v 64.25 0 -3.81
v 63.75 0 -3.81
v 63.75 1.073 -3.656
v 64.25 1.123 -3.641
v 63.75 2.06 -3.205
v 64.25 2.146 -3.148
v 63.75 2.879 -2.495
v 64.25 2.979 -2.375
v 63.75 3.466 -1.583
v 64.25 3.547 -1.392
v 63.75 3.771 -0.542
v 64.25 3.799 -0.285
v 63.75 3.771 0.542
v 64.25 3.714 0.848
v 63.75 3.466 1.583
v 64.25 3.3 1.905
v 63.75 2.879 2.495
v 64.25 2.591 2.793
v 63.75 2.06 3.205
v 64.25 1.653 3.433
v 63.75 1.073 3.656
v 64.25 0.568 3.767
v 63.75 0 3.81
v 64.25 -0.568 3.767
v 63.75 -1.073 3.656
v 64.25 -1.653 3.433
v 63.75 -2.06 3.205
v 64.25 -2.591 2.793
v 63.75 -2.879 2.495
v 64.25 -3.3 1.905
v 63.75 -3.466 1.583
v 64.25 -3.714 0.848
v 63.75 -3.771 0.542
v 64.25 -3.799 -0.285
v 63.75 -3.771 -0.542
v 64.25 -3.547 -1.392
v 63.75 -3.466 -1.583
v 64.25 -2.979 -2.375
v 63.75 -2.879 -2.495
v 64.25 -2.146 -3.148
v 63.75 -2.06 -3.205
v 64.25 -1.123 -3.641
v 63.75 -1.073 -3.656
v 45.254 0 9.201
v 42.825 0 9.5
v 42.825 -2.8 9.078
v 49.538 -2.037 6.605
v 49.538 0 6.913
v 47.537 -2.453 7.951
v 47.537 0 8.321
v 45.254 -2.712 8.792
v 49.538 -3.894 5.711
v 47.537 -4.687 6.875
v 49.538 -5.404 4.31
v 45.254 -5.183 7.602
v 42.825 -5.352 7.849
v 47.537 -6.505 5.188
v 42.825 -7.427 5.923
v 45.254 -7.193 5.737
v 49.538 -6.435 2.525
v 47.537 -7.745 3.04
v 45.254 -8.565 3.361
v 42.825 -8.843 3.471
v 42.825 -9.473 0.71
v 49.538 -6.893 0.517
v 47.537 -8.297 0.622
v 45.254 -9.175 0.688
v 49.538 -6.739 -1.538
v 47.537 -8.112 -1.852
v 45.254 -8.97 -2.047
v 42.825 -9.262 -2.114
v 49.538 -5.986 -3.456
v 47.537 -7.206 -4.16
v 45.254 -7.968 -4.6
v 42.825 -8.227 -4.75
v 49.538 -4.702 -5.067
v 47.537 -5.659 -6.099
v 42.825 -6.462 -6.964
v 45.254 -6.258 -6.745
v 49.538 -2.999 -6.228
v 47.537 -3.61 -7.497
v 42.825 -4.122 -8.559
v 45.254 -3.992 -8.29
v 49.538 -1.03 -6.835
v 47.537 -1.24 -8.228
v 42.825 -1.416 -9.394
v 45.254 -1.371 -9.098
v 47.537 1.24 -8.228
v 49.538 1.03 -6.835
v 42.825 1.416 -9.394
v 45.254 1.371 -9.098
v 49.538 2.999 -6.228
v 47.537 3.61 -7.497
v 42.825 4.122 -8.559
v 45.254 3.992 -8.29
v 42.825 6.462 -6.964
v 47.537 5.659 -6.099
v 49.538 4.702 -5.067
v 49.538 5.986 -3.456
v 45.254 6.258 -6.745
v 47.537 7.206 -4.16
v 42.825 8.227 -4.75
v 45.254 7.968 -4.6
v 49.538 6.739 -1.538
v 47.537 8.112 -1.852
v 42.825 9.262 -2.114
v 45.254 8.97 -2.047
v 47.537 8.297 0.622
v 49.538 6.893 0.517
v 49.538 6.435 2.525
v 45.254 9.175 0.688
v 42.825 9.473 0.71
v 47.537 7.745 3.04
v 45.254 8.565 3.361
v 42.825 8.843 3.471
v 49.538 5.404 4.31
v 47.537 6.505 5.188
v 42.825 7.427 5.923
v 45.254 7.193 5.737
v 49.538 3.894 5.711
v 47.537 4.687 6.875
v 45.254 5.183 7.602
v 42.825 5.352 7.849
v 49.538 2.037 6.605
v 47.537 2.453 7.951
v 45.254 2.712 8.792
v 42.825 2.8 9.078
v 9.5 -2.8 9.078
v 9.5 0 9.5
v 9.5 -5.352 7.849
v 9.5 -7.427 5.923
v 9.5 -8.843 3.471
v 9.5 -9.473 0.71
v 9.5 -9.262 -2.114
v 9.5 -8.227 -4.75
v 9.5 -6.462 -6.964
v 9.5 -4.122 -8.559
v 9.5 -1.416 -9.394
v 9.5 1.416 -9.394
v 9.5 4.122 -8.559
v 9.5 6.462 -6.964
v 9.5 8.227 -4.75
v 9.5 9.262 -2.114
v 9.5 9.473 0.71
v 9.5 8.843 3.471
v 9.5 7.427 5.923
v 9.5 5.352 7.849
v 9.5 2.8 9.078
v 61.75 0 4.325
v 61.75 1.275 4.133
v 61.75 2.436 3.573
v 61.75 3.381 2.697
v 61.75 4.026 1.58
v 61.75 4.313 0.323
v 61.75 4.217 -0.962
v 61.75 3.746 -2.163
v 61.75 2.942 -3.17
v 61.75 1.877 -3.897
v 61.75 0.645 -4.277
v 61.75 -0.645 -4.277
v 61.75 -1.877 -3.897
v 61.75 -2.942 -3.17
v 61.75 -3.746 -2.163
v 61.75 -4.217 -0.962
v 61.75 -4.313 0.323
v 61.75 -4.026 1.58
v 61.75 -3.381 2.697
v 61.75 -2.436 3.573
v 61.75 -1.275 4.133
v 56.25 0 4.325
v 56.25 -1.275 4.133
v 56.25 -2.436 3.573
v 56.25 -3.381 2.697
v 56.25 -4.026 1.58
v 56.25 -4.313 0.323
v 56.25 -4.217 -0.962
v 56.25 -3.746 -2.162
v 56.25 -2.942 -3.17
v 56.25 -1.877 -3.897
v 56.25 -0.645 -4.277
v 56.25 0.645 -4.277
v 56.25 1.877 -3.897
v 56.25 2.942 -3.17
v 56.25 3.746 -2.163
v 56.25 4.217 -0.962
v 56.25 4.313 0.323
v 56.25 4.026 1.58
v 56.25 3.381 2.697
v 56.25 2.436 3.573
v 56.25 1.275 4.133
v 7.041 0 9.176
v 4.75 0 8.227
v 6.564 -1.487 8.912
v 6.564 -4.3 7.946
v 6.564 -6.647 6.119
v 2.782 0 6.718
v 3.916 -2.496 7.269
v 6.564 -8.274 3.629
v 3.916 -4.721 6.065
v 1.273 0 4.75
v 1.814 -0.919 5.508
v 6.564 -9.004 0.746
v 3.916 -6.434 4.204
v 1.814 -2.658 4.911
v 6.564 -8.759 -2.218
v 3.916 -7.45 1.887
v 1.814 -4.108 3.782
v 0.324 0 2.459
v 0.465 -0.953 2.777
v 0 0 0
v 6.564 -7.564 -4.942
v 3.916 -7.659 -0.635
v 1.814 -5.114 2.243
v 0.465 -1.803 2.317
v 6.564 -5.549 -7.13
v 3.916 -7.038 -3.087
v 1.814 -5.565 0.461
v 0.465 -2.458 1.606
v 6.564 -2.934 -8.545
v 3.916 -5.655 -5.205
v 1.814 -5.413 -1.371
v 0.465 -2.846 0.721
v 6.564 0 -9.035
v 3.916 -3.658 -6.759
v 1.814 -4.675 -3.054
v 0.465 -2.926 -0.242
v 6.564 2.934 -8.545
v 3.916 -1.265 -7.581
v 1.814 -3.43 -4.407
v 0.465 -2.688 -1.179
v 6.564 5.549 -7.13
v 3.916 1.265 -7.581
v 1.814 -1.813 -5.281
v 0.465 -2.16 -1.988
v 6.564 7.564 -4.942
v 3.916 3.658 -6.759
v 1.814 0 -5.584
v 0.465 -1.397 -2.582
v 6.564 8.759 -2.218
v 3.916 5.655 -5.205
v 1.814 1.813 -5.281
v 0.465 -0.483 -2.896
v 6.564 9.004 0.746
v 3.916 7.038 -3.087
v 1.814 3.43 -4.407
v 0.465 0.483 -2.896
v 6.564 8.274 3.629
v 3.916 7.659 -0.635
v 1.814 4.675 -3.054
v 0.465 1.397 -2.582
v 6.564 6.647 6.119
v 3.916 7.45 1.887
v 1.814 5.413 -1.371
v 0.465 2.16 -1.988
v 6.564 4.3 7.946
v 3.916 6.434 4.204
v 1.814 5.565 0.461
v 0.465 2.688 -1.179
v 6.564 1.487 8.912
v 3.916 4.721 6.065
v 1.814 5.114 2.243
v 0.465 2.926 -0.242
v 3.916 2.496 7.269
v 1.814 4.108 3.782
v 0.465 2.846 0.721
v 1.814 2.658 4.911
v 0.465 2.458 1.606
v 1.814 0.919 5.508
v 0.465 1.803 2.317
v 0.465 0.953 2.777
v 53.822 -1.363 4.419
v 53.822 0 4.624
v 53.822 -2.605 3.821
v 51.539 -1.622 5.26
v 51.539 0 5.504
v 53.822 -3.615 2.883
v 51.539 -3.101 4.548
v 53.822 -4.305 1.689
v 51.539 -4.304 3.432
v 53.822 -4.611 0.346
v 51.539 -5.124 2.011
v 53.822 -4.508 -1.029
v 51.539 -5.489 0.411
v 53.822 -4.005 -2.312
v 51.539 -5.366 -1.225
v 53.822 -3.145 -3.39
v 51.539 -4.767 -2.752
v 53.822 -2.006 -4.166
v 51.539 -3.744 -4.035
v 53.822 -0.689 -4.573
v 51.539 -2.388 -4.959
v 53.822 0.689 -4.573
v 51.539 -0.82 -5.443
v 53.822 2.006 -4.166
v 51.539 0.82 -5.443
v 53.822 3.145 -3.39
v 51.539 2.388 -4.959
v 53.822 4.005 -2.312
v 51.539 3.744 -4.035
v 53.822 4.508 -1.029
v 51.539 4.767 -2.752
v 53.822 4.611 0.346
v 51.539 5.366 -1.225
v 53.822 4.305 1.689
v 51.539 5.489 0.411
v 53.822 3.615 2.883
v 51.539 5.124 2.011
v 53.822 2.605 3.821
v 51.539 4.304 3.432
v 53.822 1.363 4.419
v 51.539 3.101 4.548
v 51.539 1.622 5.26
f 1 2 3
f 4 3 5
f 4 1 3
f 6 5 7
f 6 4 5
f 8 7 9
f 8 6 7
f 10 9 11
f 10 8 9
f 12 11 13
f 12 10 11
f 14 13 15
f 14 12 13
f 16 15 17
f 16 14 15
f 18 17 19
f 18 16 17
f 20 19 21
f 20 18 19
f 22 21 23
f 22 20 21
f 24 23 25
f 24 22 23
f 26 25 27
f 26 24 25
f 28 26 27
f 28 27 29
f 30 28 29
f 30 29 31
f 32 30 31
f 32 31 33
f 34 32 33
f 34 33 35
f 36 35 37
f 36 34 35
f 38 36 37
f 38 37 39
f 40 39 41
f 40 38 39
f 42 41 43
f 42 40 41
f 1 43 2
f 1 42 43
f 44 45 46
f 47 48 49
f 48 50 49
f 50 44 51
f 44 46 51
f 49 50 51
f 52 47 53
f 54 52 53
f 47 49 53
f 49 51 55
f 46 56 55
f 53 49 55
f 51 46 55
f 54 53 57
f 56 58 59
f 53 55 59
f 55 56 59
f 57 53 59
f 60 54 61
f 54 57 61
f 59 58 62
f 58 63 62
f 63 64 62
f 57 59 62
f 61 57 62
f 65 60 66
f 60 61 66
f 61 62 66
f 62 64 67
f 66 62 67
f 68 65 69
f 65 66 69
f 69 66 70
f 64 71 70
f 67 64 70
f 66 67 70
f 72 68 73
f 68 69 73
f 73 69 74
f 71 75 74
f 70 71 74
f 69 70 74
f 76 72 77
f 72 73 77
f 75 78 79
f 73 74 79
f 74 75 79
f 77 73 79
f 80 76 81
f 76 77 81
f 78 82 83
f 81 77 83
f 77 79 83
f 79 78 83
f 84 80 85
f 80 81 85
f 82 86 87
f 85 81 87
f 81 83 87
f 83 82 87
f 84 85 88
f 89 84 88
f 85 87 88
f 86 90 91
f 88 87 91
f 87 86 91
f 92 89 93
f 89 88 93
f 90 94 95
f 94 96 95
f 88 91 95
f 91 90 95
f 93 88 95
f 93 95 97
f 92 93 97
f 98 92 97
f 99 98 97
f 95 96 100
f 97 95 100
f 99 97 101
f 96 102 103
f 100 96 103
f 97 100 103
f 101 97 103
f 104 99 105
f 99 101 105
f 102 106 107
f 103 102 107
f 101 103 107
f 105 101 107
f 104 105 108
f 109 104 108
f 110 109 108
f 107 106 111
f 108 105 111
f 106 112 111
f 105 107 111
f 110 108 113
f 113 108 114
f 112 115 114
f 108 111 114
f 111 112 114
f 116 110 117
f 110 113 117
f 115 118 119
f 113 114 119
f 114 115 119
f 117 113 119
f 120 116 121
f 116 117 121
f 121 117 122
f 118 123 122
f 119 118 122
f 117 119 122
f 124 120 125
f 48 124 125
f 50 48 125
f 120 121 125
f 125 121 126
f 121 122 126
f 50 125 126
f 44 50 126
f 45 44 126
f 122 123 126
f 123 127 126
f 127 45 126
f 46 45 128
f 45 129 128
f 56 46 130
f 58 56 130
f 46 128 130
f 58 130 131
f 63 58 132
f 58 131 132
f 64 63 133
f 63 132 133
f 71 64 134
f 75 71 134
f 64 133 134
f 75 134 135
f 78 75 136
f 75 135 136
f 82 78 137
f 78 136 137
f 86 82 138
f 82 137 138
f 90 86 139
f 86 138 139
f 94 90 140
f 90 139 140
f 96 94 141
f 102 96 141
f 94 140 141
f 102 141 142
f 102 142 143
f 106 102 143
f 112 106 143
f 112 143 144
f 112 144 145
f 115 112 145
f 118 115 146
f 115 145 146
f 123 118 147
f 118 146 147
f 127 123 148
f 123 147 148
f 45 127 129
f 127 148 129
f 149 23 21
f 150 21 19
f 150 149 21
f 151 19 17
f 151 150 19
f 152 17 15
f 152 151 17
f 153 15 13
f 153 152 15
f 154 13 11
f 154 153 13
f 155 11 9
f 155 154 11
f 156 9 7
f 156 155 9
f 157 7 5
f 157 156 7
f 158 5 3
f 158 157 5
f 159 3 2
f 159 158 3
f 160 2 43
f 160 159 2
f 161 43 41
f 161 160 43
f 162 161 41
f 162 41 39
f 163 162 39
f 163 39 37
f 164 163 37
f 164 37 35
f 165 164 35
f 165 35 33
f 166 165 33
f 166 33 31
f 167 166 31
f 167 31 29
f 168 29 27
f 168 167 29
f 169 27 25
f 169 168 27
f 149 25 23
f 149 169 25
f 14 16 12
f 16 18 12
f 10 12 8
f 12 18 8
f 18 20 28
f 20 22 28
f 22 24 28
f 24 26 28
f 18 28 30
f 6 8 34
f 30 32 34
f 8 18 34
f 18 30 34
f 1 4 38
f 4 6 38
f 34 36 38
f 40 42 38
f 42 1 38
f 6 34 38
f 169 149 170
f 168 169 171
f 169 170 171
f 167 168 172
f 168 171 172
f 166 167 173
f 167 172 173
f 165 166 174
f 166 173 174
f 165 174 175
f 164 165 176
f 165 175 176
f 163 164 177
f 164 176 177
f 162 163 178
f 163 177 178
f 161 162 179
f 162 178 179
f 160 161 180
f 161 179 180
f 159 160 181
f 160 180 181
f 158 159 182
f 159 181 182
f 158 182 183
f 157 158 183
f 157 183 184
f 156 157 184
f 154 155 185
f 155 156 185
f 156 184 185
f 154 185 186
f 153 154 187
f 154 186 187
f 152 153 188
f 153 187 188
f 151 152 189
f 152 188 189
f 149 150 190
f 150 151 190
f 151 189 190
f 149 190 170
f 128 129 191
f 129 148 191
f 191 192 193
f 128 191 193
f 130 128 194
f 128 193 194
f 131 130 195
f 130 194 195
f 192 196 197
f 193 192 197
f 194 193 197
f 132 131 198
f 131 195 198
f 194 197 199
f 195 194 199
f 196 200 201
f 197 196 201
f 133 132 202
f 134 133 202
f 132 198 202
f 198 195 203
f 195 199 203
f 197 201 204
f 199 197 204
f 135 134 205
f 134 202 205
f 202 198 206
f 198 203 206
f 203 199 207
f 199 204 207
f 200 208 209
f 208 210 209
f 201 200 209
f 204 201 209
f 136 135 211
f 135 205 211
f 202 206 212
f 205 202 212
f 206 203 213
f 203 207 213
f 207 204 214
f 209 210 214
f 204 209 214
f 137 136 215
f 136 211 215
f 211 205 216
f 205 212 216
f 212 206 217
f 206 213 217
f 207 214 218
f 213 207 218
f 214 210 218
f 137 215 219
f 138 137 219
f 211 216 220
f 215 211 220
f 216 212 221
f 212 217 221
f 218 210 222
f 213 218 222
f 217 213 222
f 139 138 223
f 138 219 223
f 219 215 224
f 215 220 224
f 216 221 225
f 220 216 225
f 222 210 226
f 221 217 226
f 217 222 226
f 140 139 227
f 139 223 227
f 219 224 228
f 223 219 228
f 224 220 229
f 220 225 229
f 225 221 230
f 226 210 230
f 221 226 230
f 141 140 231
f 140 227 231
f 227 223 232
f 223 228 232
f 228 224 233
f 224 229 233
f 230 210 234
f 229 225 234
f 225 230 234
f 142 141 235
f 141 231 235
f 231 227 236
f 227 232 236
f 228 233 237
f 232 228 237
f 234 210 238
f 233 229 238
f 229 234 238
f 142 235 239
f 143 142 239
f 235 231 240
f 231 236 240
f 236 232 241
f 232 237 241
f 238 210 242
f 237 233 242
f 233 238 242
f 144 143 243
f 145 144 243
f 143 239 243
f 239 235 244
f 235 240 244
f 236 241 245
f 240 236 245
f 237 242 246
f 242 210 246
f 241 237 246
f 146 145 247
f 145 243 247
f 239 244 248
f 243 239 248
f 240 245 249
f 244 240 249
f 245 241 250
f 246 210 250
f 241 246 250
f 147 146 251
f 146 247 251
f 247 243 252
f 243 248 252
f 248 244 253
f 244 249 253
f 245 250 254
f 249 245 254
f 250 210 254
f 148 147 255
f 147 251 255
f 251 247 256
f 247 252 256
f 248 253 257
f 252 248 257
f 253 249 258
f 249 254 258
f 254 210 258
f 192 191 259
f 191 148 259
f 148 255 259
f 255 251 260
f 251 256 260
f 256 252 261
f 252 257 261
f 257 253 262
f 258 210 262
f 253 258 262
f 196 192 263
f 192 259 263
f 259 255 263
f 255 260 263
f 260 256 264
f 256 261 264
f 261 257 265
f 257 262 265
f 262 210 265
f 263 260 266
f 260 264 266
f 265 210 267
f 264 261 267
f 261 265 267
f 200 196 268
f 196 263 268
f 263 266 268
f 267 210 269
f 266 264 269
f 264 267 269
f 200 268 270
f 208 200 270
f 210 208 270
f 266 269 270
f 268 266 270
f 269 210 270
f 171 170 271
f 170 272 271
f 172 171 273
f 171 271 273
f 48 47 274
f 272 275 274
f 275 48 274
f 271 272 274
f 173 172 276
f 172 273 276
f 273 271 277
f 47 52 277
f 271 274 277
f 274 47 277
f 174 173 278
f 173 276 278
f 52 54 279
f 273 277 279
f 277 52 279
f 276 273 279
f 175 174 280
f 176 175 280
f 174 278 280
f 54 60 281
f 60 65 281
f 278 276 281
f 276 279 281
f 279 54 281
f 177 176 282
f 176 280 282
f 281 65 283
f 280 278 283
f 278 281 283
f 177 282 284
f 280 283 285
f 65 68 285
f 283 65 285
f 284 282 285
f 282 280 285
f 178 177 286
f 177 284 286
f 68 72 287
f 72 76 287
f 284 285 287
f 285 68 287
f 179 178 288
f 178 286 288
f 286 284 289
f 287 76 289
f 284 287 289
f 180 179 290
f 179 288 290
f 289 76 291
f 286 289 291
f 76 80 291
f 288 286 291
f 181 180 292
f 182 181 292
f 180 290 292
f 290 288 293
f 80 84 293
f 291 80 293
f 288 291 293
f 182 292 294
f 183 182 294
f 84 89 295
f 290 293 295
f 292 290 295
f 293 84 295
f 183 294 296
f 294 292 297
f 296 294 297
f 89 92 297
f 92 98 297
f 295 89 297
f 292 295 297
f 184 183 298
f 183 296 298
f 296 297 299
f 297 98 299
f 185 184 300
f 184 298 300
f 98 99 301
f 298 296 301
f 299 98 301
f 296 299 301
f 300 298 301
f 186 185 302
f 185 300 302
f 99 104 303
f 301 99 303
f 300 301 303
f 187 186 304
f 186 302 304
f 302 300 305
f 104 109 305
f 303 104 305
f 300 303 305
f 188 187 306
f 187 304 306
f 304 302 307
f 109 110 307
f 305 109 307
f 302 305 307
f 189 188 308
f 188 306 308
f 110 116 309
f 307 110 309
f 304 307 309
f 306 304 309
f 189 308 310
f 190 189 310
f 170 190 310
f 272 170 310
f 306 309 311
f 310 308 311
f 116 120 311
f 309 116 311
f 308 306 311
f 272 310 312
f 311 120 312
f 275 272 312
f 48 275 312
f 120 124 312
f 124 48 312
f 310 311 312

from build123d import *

# Parameters (mm, degrees)
SKETCH2_OUTSIDE_W  = 34.928
SKETCH2_OUTSIDE_H  = 34.928
SKETCH2_OUTSIDE_R  = 3.81
CUT_EXTRUDE1_DEPTH = 0.5
CHAMFER1_SIZE2     = 2
CHAMFER1_SIZE      = 0.515


with BuildPart() as part:
    # Sketch1 → Revolve1 (revolve)
    with BuildSketch(Plane.XY, mode=Mode.PRIVATE) as revolve1_sk:
        with BuildLine():
            Line((0, 0), (64.25, 0))
            Line((64.25, 0), (64.25, 4.325))
            Line((64.25, 4.325), (56.25, 4.325))
            ThreePointArc((56.25, 4.325), (52.653126358, 4.994271197), (49.5377095, 6.9125))
            ThreePointArc((49.5377095, 6.9125), (46.422292643, 8.830728803), (42.825419001, 9.5))
            Line((42.825419001, 9.5), (9.5, 9.5))
            ThreePointArc((9.5, 9.5), (2.782485579, 6.717514421), (0, 0))
        make_face()
    revolve(revolve1_sk.sketch.rotate(Axis((71.903875566, 0, 0), (1, 0, 0)), 90), axis=Axis((71.903875566, 0, 0), (1, 0, 0)))

    # Sketch2 outside → Cut-Extrude1 (cut)
    with BuildSketch(Plane(origin=(64.25, 0, 0), x_dir=(0, 0, -1), z_dir=(1, 0, 0))):
        Rectangle(SKETCH2_OUTSIDE_W, SKETCH2_OUTSIDE_H)
        Circle(SKETCH2_OUTSIDE_R, mode=Mode.SUBTRACT)
    extrude(amount=-CUT_EXTRUDE1_DEPTH, mode=Mode.SUBTRACT)

    # Chamfer1
    chamfer1_edges = [part.edges().sort_by_distance(p)[0] for p in [
        (63.75, 0, -4.325),
    ]]
    chamfer1_side = [part.faces().sort_by_distance(p)[0] for p in [
        (63.75, 0, -4.3147),
    ]]
    chamfer(chamfer1_edges, length=CHAMFER1_SIZE - 0.0001, length2=CHAMFER1_SIZE2 - 0.0001, reference=chamfer1_side[0])  # a hair under: the kernel refuses the full size


solid = part.part
